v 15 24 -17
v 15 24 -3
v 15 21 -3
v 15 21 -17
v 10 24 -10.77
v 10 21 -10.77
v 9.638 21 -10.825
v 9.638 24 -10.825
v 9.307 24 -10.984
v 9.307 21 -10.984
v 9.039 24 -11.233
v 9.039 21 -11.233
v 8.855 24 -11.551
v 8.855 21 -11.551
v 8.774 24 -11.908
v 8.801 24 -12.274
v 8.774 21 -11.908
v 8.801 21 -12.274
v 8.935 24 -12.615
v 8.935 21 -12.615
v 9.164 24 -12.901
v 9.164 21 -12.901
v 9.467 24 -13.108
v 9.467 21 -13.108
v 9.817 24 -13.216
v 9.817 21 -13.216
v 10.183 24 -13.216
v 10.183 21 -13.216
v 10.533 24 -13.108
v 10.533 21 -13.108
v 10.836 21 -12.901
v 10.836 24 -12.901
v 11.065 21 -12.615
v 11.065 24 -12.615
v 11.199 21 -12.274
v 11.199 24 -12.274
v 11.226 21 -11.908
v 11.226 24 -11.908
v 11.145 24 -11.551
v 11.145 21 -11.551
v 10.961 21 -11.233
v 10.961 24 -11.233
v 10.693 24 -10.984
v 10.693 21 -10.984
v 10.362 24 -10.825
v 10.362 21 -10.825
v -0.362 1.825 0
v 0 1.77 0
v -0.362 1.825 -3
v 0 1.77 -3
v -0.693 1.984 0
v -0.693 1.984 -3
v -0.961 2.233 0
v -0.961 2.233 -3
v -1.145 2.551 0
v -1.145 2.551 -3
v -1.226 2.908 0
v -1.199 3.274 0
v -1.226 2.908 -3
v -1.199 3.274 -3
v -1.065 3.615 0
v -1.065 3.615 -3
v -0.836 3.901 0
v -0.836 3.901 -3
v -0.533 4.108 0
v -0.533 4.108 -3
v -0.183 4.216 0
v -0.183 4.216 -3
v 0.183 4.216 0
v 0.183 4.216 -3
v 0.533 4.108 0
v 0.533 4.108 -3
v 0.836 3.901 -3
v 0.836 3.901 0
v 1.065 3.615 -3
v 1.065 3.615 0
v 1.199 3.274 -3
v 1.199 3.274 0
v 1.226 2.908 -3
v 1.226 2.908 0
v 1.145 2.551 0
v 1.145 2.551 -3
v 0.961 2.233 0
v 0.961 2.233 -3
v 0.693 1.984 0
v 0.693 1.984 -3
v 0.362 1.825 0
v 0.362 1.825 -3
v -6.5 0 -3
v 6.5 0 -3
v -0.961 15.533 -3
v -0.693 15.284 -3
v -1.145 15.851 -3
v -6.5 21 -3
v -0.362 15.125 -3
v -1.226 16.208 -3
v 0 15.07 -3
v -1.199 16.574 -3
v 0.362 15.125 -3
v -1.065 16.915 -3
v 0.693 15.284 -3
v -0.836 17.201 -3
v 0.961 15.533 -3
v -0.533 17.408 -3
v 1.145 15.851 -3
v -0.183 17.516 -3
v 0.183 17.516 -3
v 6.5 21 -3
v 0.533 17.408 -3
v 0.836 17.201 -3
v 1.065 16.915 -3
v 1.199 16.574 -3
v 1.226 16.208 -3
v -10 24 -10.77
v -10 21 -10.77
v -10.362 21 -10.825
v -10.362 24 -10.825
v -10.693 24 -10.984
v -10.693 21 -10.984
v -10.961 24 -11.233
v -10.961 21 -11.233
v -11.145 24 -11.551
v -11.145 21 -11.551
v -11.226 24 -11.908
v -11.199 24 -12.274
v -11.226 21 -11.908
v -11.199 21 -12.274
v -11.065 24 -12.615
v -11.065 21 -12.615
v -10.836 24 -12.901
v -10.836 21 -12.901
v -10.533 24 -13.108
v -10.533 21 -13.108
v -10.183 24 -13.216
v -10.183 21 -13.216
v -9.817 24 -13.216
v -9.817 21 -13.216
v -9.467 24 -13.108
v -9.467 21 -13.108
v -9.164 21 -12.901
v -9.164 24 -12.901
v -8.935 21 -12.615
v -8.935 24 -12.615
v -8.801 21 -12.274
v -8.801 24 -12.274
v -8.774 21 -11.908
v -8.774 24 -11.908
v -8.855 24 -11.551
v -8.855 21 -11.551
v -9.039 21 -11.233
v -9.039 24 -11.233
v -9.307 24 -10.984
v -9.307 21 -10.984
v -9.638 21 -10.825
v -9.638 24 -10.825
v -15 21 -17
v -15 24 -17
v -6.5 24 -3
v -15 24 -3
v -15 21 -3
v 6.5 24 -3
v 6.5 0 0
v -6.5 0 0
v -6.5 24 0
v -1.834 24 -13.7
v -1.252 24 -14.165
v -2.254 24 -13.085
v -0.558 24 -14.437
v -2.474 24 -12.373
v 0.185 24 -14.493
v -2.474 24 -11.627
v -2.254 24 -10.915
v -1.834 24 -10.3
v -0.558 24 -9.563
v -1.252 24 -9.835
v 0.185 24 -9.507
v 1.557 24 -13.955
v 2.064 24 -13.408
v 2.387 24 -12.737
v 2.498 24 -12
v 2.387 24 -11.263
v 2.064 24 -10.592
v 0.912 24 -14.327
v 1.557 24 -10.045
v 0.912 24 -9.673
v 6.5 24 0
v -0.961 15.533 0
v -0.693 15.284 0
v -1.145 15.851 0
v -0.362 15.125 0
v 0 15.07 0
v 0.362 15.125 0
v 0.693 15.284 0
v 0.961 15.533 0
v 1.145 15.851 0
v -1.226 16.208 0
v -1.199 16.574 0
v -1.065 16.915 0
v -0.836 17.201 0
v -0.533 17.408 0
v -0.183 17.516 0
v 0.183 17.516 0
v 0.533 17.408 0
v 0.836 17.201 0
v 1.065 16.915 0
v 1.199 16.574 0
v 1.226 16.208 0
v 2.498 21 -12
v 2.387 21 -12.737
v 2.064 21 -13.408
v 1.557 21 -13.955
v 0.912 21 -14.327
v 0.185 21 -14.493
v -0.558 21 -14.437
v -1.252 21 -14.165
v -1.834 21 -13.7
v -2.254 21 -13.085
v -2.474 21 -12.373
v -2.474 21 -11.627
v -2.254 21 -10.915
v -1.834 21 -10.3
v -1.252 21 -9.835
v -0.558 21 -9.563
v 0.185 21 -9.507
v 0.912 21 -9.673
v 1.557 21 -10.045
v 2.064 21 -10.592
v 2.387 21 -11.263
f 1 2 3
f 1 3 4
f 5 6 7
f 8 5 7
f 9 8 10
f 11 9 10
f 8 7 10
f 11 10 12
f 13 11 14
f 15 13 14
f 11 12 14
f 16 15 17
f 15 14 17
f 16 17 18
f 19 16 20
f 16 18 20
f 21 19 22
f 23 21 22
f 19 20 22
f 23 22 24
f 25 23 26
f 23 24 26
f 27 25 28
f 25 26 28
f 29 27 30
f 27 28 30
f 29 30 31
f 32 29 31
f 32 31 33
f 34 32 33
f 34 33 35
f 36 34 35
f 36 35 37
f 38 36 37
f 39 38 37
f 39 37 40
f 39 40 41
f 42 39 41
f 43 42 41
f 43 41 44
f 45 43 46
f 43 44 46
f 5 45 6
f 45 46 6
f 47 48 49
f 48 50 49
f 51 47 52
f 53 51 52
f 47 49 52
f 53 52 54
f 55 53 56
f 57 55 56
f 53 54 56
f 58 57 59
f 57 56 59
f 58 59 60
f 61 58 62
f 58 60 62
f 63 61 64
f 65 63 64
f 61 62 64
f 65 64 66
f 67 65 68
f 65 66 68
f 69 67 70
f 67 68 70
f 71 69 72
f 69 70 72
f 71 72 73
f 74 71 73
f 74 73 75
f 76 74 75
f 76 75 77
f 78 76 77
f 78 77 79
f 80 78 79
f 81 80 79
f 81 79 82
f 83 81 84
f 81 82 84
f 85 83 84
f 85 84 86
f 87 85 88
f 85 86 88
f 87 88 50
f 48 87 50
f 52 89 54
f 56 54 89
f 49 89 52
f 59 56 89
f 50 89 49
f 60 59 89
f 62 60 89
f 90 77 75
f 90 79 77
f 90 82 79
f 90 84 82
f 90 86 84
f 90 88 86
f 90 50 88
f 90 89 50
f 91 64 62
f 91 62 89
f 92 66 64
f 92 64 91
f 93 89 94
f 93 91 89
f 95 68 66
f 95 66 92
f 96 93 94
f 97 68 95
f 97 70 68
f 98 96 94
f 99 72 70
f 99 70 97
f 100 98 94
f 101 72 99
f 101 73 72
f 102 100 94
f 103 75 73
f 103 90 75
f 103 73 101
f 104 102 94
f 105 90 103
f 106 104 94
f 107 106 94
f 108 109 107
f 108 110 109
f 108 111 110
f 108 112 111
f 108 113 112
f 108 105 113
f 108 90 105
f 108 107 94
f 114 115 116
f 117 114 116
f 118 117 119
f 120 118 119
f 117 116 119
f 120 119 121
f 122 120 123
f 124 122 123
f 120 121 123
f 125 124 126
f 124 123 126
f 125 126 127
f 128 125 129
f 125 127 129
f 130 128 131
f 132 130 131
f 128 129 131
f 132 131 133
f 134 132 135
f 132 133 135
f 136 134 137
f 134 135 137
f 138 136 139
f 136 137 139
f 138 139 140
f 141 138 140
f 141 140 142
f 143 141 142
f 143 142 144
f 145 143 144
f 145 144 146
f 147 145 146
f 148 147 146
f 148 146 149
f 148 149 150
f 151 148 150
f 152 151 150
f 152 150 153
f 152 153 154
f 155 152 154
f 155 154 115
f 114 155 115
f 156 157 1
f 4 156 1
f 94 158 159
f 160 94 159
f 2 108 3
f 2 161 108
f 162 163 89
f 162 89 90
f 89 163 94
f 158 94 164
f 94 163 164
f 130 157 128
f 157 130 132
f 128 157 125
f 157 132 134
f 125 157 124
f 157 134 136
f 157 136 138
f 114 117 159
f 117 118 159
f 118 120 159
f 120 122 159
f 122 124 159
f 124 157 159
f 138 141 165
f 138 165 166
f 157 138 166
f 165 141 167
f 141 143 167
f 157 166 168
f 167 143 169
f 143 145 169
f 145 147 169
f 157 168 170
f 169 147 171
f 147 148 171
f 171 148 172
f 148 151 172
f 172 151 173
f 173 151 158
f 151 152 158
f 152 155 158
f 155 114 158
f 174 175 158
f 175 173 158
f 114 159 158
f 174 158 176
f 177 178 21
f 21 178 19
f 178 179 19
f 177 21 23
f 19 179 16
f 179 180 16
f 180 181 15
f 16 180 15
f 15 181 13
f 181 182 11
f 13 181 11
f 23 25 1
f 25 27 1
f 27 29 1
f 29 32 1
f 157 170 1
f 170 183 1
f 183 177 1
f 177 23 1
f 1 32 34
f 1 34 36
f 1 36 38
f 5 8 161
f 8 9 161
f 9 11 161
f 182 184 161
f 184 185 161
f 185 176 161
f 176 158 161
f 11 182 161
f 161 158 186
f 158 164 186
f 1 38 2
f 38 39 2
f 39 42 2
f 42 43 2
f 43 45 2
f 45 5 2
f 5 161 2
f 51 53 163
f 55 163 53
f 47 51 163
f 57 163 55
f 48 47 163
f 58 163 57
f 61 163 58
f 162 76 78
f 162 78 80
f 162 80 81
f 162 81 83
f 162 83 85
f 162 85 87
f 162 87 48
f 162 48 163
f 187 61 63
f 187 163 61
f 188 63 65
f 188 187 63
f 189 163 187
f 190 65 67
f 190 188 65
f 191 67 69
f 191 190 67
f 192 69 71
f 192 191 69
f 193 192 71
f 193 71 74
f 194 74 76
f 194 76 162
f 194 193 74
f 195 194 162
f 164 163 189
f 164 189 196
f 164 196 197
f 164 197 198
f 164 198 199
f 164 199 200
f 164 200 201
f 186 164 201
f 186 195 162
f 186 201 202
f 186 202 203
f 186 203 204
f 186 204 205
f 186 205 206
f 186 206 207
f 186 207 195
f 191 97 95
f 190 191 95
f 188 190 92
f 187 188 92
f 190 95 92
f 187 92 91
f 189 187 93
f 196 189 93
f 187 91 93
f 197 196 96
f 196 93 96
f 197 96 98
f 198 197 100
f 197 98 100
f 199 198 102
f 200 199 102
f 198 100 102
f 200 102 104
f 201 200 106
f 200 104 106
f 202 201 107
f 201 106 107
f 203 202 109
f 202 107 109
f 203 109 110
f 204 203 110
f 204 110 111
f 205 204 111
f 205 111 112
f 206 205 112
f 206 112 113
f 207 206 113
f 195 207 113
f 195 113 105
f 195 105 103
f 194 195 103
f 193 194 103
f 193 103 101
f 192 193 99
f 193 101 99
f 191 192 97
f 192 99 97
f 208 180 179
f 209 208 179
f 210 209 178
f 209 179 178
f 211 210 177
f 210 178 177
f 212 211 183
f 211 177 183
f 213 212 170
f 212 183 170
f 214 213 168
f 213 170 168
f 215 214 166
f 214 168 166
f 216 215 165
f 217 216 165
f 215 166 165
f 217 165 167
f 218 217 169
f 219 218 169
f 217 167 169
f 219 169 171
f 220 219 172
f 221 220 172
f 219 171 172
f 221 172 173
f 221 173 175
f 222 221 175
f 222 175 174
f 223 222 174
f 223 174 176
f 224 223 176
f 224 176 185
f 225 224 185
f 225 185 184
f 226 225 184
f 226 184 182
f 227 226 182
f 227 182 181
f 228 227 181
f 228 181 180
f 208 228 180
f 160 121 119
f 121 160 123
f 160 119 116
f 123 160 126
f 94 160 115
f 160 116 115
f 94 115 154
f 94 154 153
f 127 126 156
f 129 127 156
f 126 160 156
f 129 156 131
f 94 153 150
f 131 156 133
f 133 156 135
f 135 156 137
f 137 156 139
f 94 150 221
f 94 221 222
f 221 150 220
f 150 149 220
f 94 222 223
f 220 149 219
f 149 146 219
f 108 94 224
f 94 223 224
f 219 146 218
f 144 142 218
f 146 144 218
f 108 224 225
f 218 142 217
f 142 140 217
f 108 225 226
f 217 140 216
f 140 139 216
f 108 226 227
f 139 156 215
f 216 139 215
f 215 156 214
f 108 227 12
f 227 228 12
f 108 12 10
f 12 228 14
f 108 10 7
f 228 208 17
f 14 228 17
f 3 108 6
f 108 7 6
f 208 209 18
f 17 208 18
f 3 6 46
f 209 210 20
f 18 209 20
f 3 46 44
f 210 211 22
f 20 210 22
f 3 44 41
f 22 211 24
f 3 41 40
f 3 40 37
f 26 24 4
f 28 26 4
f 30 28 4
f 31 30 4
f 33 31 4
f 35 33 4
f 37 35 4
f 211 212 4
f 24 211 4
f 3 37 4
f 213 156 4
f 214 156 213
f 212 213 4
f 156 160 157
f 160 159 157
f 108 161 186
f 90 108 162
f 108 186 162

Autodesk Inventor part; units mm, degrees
ref_plane "YZ Plane" through (0, 0, 0) normal (1, 0, 0) x (0, 1, 0)
ref_plane "XZ Plane" through (0, 0, 0) normal (0, 1, 0) x (-1, 0, 0)
ref_plane "XY Plane" through (0, 0, 0) normal (0, 0, 1) x (1, 0, 0)
sketch "Szkic1" plane through (0, 0, 0) normal (0, 0, 1) x (1, 0, 0)
  line L0 (-9.1, 0) -> (9.1, 0) projected
  line L1 (0, -4.8) -> (0, 28.8) projected
  line L2 (-6.5, 24) -> (6.5, 24)
  line L3 (6.5, 24) -> (6.5, 0)
  line L4 (6.5, 0) -> (-6.5, 0)
  line L5 (-6.5, 0) -> (-6.5, 24)
  line L6 (0, 24) -> (0, 0)
  dimension "d0" = 13
  dimension "d1" = 24
extrude "Wyciągnięcie proste1" add sketch "Szkic1" against normal blind 17
sketch "Szkic2" plane through (6.5, 0, 0) normal (1, 0, 0) x (0, 0, -1)
  line L0 (17, 24) -> (17, 0) projected
  line L1 (17, 0) -> (3, 0)
  line L2 (3, 0) -> (3, 21)
  line L3 (3, 21) -> (17, 21)
  line L4 (17, 21) -> (17, 0)
  point P0 (0, 0)
  dimension "d4" = 14
  dimension "d5" = 21
extrude "Wyciągnięcie proste2" cut sketch "Szkic2" against normal blind 13
sketch "Szkic3" plane through (0, 0, 0) normal (0, 0, 1) x (1, 0, 0)
  line L0 (6.5, 24) -> (-6.5, 24) projected
  line L1 (-6.5, 0) -> (6.5, 0) projected
  point P0 (0, 0)
  point P1 (0, 16.3)
  point P2 (0, 3)
  dimension "d8" = 7.7
  dimension "d10" = 3
hole "Otwór1" at (0, 16.3, 0) at (0, 3, 0) direction (0, 0, -1) diameter 2.459 end through all thread size "M3x0.5" class "6H" standard "ISO Metric profile"
sketch "Szkic4" plane through (-6.5, 24, 0) normal (0, 1, 0) x (1, 0, 0)
  line L0 (13, 3) -> (0, 3) projected
  line L1 (0, 17) -> (13, 17) projected
  line L2 (6.5, 17) -> (6.5, 3)
  circle A0 centre (6.5, 12) radius 2.5
  line L3 (13, 0) -> (13, 17) projected
  line L4 (19, 12) -> (-6, 12)
  line L5 (0, 3) -> (-6, 3)
  line L6 (-6, 3) -> (-6, 17)
  line L7 (-6, 17) -> (0, 17)
  line L8 (0, 17) -> (0, 3)
  line L9 (13, 3) -> (19, 3)
  line L10 (19, 3) -> (19, 17)
  line L11 (19, 17) -> (13, 17)
  line L12 (13, 17) -> (13, 3)
  line L13 (-3.5, 3) -> (-3.5, 17)
  line L14 (0, 0) -> (0, 17) projected
  line L15 (0, 3) -> (0, 17)
  line L16 (16.5, 3) -> (16.5, 17)
  point P0 (6.5, 0)
  point P1 (0, 12)
  dimension "d18" = 5
  dimension "d20" = 5
  dimension "d21" = 6
  dimension "d22" = 6
  dimension "d23" = 3.5
extrude "Wyciągnięcie proste3" add sketch "Szkic4" against normal blind 3 contours L3 L4 L16 L9 | L3 L11 L16 L4 | L16 L4 L10 L9 | L5 L13 L4 L8 | L16 L11 L10 L4 | L5 L6 L4 L13 | L4 L13 L7 L8 | L4 L6 L7 L13
sketch "Szkic5" plane through (-6.5, 24, 0) normal (0, 1, 0) x (1, 0, 0)
  line L0 (13, 3) -> (0, 3) projected
  line L1 (6.5, 0) -> (6.5, 17)
  line L2 (-6, 17) -> (19, 17) projected
  line L3 (19, 17) -> (19, 3) projected
  line L4 (19, 12) -> (-6.0034, 12)
  line L5 (19, 3) -> (13, 3) projected
  line L6 (16.5, 3) -> (16.5, 17)
  line L7 (-3.5, 3) -> (-3.5, 17)
  circle A0 centre (6.4983, 12) radius 2.5
  dimension "d4" = 14
  dimension "d5" = 21
  dimension "d26" = 5
  dimension "d27" = 2.5
  dimension "d28" = 5
extrude "Wyciągnięcie proste4" cut sketch "Szkic5" against normal blind 3 contours A0 L4 L1 | L1 L4 A0 | L4 A0 L1 | L1 A0 L4
sketch "Szkic6" plane through (-6.5, 24, 0) normal (0, 1, 0) x (1, 0, 0)
  line L0 (6.5, 0) -> (6.5, 17)
  line L1 (-6, 17) -> (19, 17) projected
  line L2 (19, 17) -> (19, 3) projected
  line L3 (19, 12) -> (-5.9544, 12)
  line L4 (19, 3) -> (13, 3) projected
  line L5 (16.5, 3) -> (16.5, 17)
  line L6 (-3.5, 3) -> (-3.5, 17)
  point P0 (16.5, 12)
  point P1 (-3.5, 12)
  dimension "d31" = 5
  dimension "d32" = 2.5
hole "Otwór2" at (10, 24, -12) at (-10, 24, -12) direction (0, -1, 0) diameter 2.459 end through all thread size "M3x0.5" class "6H" standard "ISO Metric profile"
sketch "Szkic7" plane through (-6.5, 24, 0) normal (0, 1, 0) x (1, 0, 0)
  line L0 (19, 3) -> (13, 3) projected
  line L1 (19, 3) -> (21.5, 3)
  line L2 (21.5, 3) -> (21.5, 17)
  line L3 (21.5, 17) -> (19, 17)
  line L4 (19, 17) -> (19, 3)
  line L5 (-6, 3) -> (-6, 17) projected
  line L6 (-6, 3) -> (-8.5, 3)
  line L7 (-8.5, 3) -> (-8.5, 17)
  line L8 (-8.5, 17) -> (-6, 17)
  line L9 (-6, 17) -> (-6, 3)
  point P0 (6.5, 0)
  dimension "d40" = 2.5
  dimension "d41" = 2.5
extrude "Wyciągnięcie proste5" add sketch "Szkic7" against normal blind 3
properties part number "adapter" material "Stal nierdzewna 440C"
